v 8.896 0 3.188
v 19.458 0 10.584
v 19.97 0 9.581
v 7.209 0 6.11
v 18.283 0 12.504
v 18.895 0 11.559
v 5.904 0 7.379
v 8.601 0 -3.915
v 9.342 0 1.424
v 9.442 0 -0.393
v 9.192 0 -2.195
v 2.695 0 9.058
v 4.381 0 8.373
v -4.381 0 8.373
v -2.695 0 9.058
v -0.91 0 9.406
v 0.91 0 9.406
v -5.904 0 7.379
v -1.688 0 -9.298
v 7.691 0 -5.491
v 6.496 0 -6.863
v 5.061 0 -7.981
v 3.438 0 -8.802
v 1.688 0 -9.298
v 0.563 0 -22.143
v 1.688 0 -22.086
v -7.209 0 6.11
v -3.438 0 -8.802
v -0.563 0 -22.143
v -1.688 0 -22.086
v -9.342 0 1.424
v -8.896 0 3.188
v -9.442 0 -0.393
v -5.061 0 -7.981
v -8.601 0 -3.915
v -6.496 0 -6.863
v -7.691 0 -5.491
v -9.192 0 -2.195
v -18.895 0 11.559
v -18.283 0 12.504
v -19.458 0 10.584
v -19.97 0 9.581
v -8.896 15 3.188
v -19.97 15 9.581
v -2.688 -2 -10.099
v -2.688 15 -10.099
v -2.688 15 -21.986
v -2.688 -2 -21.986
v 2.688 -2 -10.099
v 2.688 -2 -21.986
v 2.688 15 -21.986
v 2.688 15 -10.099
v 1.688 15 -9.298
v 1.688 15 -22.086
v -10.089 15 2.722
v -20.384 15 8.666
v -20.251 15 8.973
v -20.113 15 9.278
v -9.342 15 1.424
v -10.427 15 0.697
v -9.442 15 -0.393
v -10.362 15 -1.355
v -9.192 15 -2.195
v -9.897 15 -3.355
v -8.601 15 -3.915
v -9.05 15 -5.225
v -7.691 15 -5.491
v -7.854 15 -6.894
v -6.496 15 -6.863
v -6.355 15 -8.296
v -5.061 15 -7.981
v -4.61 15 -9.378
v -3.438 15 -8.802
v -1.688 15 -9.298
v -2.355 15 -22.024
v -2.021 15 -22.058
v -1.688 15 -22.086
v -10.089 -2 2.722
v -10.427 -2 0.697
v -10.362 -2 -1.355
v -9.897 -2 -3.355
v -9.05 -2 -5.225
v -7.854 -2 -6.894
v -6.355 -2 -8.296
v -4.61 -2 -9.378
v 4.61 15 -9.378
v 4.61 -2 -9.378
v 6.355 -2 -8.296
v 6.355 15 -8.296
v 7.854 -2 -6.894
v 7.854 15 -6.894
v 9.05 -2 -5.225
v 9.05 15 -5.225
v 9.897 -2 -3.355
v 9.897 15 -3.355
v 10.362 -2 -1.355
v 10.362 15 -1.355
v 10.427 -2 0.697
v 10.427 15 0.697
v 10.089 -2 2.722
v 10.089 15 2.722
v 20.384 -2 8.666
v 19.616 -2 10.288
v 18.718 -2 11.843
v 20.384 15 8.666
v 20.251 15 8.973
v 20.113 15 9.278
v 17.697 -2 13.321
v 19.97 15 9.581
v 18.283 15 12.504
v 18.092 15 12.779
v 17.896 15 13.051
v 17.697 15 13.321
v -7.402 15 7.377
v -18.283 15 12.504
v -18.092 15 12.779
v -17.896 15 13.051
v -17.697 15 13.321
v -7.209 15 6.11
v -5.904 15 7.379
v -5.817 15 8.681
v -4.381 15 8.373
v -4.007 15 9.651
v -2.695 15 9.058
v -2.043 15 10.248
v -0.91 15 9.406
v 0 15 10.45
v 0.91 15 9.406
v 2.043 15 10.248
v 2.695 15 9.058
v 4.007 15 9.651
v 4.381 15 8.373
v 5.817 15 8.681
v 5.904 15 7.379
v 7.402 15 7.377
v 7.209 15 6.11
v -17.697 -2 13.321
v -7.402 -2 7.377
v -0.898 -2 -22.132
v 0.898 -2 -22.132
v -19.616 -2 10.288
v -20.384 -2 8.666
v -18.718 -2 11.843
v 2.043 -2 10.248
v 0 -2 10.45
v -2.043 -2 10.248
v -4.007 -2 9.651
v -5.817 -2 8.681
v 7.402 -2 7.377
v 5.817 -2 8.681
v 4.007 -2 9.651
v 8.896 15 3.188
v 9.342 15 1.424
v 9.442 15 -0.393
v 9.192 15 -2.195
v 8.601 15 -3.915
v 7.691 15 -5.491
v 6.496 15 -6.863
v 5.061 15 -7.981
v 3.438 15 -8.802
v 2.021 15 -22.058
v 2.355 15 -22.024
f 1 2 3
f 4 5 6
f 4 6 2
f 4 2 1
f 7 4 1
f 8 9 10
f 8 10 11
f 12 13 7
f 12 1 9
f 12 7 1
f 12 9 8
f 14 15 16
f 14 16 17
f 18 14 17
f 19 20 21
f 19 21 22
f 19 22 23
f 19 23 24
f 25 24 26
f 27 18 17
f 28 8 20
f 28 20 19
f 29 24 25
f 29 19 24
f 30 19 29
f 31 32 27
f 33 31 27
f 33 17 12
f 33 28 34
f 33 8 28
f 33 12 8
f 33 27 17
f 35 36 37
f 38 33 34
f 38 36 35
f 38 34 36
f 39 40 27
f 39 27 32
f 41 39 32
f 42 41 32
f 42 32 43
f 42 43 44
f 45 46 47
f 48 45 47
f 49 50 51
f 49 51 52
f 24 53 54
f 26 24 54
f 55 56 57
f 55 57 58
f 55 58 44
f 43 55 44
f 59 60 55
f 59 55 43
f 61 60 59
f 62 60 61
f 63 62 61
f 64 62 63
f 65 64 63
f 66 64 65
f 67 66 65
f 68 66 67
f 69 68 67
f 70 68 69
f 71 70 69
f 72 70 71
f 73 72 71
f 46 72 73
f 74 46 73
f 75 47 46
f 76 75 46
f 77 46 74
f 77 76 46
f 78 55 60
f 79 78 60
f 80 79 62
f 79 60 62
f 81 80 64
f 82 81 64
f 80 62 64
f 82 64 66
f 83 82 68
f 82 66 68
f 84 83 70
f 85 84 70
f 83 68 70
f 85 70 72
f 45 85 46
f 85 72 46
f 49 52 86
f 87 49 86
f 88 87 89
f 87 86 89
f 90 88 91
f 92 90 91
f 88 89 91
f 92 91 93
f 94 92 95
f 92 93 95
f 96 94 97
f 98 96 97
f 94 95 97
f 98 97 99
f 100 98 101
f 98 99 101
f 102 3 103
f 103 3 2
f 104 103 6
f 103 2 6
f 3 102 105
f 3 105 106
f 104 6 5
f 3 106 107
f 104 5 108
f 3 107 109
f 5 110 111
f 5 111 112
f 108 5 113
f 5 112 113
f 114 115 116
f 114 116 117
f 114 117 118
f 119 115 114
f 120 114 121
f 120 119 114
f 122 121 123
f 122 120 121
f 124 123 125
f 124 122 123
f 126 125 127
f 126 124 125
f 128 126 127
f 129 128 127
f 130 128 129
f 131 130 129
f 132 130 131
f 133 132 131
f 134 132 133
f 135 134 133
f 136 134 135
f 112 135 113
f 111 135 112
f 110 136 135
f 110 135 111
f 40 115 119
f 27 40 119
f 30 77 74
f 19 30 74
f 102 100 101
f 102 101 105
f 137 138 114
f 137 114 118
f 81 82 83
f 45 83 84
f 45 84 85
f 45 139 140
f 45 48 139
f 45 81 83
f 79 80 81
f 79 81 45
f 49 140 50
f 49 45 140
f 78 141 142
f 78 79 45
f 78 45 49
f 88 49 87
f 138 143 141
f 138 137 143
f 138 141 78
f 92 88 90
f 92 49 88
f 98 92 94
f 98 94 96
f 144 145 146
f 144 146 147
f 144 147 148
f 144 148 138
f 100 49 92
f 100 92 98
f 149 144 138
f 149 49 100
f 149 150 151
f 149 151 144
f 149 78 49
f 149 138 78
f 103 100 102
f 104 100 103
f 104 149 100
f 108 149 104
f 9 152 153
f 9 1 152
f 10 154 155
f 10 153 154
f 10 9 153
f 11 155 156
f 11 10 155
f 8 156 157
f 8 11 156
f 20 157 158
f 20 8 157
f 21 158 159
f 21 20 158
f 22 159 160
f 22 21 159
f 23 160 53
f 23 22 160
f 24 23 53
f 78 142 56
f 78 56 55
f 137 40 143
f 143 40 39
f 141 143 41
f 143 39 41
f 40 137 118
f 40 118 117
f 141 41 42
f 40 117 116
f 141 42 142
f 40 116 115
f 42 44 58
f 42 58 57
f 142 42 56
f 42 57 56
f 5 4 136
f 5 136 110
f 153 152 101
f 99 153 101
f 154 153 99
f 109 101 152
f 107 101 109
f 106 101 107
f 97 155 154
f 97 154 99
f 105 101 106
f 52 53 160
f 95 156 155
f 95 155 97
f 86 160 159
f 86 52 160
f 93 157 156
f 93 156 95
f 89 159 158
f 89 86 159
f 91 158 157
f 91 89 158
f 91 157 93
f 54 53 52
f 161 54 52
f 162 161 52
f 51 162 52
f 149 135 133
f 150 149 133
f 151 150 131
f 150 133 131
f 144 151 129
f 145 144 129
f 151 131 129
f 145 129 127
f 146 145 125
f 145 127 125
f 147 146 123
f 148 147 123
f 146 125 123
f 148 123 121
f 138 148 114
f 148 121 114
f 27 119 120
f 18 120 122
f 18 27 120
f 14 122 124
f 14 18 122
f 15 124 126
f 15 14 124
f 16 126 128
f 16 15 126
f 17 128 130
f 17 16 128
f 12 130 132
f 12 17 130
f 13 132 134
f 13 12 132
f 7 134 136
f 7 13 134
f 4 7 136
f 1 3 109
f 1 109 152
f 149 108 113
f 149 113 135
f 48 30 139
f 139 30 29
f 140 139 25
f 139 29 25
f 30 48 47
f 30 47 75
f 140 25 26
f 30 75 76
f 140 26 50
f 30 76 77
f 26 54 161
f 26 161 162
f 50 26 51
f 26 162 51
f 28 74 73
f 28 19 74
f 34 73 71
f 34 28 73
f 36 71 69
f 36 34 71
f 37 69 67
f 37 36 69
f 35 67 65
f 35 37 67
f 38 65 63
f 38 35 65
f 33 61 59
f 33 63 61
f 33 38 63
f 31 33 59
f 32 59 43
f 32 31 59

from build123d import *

# Parameters (mm, degrees)
SKETCH2_R           = 22.15
SKETCH2_R_2         = 9.45
BOSS_EXTRUDE2_DEPTH = 15
SKETCH3_R           = 22.15
BOSS_EXTRUDE3_DEPTH = 2
CUT_EXTRUDE1_DEPTH  = 15
CIRPATTERN1_COUNT   = 3
CUT_EXTRUDE2_DEPTH  = 17
CIRPATTERN2_COUNT   = 3


with BuildPart() as part:
    # Sketch2 → Boss-Extrude2 (new body)
    with BuildSketch(Plane(origin=(0, 0, 0), x_dir=(1, 0, 0), z_dir=(0, 1, 0))):
        Circle(SKETCH2_R)
        Circle(SKETCH2_R_2, mode=Mode.SUBTRACT)
    extrude(amount=BOSS_EXTRUDE2_DEPTH)

    # Sketch3 → Boss-Extrude3 (add)
    with BuildSketch(Plane.XZ):
        Circle(SKETCH3_R)
    extrude(amount=BOSS_EXTRUDE3_DEPTH)

    # Sketch4 → Cut-Extrude1 (cut)
    with BuildSketch(Plane(origin=(0, 15, 0), x_dir=(1, 0, 0), z_dir=(0, 1, 0))):
        with BuildLine():
            Line((-1.6875, 22.085625274), (-1.6875, 9.298109687))
            ThreePointArc((-1.6875, 9.298109687), (0, 9.45), (1.6875, 9.298109687))
            Line((1.6875, 9.298109687), (1.6875, 22.085625274))
            ThreePointArc((1.6875, 22.085625274), (0, 22.15), (-1.6875, 22.085625274))
        make_face()
    cut_extrude1 = extrude(amount=-CUT_EXTRUDE1_DEPTH, mode=Mode.SUBTRACT)

    # CirPattern1: Cut-Extrude1 ×3 about axis
    cirpattern1_axis = Axis((0, 0, 0), (0, 1, 0))
    for i in range(1, CIRPATTERN1_COUNT):
        add(cut_extrude1.rotate(cirpattern1_axis, i * 360 / CIRPATTERN1_COUNT), mode=Mode.SUBTRACT)

    # Sketch6 → Cut-Extrude2 (cut)
    with BuildSketch(Plane(origin=(0, 15, 0), x_dir=(1, 0, 0), z_dir=(0, 1, 0))):
        with BuildLine():
            Line((-20.384492706, -8.665734654), (-10.089313607, -2.72181023))
            ThreePointArc((-10.089313607, -2.72181023), (-9.04996547, 5.225), (-2.6875, 10.098507006))
            Line((-2.6875, 10.098507006), (-2.6875, 21.986355854))
            ThreePointArc((-2.6875, 21.986355854), (-19.182462694, 11.075), (-20.384492706, -8.665734654))
        make_face()
    cut_extrude2 = extrude(amount=-CUT_EXTRUDE2_DEPTH, mode=Mode.SUBTRACT)

    # CirPattern2: Cut-Extrude2 ×3 about axis
    cirpattern2_axis = Axis((0, 0, 0), (0, 1, 0))
    for i in range(1, CIRPATTERN2_COUNT):
        add(cut_extrude2.rotate(cirpattern2_axis, i * 360 / CIRPATTERN2_COUNT), mode=Mode.SUBTRACT)


solid = part.part
